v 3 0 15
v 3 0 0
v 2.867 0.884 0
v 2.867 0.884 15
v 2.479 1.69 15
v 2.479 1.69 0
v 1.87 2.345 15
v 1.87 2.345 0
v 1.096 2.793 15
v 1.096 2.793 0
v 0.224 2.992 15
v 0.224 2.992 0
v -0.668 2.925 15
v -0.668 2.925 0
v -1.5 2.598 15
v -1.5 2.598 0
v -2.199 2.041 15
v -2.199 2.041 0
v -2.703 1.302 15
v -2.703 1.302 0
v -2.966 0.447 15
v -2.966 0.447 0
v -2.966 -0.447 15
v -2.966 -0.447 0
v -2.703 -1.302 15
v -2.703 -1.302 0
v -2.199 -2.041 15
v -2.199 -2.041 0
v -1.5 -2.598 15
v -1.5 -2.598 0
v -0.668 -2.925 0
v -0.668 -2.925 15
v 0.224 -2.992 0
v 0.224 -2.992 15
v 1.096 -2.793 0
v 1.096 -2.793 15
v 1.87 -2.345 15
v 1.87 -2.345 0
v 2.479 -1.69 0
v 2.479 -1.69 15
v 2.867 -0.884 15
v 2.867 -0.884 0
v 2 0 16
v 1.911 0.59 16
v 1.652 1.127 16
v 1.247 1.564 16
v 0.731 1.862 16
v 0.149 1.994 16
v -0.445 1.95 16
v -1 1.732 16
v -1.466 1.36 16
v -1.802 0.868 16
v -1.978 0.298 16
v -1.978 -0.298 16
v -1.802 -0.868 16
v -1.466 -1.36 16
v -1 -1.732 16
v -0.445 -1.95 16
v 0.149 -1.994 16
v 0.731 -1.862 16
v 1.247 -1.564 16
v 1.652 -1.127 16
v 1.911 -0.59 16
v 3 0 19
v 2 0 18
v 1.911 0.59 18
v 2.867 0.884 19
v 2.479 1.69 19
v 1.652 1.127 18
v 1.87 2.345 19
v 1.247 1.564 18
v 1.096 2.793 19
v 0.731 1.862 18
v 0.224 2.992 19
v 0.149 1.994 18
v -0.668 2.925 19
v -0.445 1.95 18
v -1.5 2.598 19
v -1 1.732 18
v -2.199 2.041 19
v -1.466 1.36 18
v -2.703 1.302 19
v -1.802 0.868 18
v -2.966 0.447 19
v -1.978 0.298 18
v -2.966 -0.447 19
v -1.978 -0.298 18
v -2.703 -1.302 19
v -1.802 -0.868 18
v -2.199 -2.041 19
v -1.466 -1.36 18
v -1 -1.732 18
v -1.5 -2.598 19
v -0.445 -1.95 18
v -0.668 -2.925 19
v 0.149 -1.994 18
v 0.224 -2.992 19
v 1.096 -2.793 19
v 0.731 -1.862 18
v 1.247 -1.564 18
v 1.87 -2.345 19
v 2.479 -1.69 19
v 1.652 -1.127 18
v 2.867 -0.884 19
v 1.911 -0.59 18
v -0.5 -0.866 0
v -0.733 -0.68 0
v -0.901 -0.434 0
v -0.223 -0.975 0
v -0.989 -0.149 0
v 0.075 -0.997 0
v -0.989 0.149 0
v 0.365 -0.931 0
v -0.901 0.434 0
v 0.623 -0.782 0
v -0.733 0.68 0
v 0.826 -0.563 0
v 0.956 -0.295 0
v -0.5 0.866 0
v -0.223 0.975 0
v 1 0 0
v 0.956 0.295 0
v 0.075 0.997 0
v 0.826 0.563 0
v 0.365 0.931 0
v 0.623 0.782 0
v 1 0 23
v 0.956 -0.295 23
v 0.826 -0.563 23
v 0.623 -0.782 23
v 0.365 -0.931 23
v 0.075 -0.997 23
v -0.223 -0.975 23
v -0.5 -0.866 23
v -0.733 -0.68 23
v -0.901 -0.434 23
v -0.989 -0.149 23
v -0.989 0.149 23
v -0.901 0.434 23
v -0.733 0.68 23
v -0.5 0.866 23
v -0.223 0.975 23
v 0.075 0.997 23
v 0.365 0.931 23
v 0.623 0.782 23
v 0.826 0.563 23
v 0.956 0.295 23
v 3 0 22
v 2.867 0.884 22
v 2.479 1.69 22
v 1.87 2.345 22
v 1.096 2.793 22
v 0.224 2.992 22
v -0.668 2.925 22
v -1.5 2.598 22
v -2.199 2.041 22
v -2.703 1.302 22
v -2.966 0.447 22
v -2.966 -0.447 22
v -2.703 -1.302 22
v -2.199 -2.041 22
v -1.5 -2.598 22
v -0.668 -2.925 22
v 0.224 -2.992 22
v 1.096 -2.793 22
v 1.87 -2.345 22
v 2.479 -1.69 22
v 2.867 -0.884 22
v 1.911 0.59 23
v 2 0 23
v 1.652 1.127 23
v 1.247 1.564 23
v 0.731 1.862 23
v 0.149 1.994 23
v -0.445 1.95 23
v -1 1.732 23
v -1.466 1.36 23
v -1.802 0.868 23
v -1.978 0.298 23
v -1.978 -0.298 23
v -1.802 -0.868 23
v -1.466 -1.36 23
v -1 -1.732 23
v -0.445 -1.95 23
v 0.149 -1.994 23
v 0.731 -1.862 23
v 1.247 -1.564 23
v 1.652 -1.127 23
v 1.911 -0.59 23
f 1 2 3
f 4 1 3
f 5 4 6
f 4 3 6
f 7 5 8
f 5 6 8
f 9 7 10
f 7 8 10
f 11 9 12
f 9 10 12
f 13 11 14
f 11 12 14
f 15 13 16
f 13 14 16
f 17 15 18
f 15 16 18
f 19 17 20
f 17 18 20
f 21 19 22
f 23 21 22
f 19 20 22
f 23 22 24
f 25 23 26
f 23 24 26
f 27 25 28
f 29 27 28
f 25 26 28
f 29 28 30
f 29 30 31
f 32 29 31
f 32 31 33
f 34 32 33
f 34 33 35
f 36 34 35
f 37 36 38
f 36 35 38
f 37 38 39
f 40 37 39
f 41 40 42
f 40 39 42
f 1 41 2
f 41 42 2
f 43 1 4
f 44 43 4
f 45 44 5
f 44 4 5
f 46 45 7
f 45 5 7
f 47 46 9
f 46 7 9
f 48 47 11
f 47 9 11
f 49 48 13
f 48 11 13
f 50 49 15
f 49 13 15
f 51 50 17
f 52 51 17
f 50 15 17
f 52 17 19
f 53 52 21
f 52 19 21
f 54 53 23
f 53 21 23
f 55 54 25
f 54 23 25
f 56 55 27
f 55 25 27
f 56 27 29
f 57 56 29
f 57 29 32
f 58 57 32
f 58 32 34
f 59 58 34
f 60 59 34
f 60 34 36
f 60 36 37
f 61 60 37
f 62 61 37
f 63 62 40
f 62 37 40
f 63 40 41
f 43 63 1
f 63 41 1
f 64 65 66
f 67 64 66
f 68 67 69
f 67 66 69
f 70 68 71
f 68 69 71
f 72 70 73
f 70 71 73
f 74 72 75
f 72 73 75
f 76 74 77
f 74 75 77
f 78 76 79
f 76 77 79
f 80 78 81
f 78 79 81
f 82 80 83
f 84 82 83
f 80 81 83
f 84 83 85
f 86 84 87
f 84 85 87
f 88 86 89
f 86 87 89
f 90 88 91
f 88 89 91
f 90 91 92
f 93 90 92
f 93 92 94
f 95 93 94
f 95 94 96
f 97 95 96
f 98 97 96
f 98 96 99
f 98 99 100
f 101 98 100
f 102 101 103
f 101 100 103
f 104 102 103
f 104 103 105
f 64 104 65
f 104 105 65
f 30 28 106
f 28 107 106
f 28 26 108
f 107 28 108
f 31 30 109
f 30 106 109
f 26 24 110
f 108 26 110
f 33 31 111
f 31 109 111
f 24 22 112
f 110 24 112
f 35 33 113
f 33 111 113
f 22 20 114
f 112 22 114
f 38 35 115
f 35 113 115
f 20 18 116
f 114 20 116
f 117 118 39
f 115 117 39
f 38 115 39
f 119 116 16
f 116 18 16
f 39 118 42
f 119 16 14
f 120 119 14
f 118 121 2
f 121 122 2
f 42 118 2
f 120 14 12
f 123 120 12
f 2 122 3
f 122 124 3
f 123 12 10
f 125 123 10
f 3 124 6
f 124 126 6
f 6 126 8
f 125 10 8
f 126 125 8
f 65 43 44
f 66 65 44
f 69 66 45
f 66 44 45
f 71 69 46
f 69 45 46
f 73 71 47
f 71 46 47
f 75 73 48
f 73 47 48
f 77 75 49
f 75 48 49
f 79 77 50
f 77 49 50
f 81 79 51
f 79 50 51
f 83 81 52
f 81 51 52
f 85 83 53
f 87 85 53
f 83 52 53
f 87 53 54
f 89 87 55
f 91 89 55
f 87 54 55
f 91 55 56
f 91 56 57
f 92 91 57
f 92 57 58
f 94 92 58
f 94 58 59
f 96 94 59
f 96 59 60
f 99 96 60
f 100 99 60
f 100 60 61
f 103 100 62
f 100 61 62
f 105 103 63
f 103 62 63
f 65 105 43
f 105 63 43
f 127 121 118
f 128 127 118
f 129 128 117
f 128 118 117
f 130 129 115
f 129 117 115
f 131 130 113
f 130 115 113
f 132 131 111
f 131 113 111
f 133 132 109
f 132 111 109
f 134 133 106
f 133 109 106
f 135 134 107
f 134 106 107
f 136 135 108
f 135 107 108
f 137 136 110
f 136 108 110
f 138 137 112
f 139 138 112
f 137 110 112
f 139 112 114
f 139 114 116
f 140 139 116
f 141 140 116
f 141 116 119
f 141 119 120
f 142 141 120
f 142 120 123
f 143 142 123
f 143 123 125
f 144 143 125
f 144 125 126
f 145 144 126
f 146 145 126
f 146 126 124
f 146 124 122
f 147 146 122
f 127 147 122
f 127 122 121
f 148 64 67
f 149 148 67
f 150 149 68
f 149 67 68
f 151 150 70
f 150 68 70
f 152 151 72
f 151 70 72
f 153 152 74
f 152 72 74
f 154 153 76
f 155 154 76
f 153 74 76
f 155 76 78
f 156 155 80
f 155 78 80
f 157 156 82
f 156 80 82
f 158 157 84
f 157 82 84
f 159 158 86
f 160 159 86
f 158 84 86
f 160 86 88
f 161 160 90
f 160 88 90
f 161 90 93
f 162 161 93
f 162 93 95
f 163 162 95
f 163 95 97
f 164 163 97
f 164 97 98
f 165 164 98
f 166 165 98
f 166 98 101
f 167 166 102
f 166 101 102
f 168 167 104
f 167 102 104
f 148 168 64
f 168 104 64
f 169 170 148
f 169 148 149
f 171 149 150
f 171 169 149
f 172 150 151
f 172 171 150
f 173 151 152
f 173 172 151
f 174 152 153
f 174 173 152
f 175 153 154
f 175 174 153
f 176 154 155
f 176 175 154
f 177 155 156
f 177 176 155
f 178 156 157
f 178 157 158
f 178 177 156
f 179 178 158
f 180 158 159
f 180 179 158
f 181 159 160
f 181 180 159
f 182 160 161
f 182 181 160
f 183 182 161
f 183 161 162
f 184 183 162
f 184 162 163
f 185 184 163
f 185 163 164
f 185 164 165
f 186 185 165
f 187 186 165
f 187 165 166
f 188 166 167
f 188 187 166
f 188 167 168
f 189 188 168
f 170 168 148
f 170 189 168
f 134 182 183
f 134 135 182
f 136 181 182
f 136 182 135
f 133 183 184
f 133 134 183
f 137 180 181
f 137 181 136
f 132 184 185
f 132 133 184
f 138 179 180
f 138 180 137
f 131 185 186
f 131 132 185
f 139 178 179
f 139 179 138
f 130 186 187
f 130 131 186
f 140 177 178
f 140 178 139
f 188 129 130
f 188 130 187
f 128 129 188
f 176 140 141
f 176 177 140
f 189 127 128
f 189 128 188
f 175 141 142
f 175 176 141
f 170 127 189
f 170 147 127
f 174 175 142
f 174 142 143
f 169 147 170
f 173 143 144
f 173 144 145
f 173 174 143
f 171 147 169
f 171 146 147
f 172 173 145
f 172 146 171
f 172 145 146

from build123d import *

# Parameters (mm, degrees)
F0_R     = 3
F1_DEPTH = 16
F2_R     = 2
F3_DEPTH = 2
F4_R     = 3
F5_DEPTH = 5
F6_SIZE  = 0.99999
F7_R     = 1
F8_DEPTH = 25


# Not quite as in the source:
# - a fillet or chamfer is up to 0.001 mm smaller than in the source, because OpenCascade refuses the exact size


with BuildPart() as f1:
    # F0 (on Top) → F1 (new body)
    with BuildSketch(Plane.XY):
        Circle(F0_R)
    extrude(amount=F1_DEPTH)

    # F2 (on face) → F3 (join)
    with BuildSketch(Plane.XY.offset(16)):
        Circle(F2_R)
    extrude(amount=F3_DEPTH)

    # F4 (on face) → F5 (join)
    with BuildSketch(Plane.XY.offset(18)):
        Circle(F4_R)
    extrude(amount=F5_DEPTH)

    # F6 (size 1 in the source; OpenCascade refuses exactly that, so slightly less here)
    f6_edges = [f1.edges().sort_by_distance(p)[0] for p in [
        (-3, 0, 23),
        (-3, 0, 18),
        (-3, 0, 16),
    ]]
    chamfer(f6_edges, length=F6_SIZE)

    # F7 (on face) → F8 (cut)
    with BuildSketch(Plane(origin=(0, 0, 0), x_dir=(1, 0, 0), z_dir=(0, 0, -1))):
        Circle(F7_R)
    extrude(amount=-F8_DEPTH, mode=Mode.SUBTRACT)


solid = f1.part
